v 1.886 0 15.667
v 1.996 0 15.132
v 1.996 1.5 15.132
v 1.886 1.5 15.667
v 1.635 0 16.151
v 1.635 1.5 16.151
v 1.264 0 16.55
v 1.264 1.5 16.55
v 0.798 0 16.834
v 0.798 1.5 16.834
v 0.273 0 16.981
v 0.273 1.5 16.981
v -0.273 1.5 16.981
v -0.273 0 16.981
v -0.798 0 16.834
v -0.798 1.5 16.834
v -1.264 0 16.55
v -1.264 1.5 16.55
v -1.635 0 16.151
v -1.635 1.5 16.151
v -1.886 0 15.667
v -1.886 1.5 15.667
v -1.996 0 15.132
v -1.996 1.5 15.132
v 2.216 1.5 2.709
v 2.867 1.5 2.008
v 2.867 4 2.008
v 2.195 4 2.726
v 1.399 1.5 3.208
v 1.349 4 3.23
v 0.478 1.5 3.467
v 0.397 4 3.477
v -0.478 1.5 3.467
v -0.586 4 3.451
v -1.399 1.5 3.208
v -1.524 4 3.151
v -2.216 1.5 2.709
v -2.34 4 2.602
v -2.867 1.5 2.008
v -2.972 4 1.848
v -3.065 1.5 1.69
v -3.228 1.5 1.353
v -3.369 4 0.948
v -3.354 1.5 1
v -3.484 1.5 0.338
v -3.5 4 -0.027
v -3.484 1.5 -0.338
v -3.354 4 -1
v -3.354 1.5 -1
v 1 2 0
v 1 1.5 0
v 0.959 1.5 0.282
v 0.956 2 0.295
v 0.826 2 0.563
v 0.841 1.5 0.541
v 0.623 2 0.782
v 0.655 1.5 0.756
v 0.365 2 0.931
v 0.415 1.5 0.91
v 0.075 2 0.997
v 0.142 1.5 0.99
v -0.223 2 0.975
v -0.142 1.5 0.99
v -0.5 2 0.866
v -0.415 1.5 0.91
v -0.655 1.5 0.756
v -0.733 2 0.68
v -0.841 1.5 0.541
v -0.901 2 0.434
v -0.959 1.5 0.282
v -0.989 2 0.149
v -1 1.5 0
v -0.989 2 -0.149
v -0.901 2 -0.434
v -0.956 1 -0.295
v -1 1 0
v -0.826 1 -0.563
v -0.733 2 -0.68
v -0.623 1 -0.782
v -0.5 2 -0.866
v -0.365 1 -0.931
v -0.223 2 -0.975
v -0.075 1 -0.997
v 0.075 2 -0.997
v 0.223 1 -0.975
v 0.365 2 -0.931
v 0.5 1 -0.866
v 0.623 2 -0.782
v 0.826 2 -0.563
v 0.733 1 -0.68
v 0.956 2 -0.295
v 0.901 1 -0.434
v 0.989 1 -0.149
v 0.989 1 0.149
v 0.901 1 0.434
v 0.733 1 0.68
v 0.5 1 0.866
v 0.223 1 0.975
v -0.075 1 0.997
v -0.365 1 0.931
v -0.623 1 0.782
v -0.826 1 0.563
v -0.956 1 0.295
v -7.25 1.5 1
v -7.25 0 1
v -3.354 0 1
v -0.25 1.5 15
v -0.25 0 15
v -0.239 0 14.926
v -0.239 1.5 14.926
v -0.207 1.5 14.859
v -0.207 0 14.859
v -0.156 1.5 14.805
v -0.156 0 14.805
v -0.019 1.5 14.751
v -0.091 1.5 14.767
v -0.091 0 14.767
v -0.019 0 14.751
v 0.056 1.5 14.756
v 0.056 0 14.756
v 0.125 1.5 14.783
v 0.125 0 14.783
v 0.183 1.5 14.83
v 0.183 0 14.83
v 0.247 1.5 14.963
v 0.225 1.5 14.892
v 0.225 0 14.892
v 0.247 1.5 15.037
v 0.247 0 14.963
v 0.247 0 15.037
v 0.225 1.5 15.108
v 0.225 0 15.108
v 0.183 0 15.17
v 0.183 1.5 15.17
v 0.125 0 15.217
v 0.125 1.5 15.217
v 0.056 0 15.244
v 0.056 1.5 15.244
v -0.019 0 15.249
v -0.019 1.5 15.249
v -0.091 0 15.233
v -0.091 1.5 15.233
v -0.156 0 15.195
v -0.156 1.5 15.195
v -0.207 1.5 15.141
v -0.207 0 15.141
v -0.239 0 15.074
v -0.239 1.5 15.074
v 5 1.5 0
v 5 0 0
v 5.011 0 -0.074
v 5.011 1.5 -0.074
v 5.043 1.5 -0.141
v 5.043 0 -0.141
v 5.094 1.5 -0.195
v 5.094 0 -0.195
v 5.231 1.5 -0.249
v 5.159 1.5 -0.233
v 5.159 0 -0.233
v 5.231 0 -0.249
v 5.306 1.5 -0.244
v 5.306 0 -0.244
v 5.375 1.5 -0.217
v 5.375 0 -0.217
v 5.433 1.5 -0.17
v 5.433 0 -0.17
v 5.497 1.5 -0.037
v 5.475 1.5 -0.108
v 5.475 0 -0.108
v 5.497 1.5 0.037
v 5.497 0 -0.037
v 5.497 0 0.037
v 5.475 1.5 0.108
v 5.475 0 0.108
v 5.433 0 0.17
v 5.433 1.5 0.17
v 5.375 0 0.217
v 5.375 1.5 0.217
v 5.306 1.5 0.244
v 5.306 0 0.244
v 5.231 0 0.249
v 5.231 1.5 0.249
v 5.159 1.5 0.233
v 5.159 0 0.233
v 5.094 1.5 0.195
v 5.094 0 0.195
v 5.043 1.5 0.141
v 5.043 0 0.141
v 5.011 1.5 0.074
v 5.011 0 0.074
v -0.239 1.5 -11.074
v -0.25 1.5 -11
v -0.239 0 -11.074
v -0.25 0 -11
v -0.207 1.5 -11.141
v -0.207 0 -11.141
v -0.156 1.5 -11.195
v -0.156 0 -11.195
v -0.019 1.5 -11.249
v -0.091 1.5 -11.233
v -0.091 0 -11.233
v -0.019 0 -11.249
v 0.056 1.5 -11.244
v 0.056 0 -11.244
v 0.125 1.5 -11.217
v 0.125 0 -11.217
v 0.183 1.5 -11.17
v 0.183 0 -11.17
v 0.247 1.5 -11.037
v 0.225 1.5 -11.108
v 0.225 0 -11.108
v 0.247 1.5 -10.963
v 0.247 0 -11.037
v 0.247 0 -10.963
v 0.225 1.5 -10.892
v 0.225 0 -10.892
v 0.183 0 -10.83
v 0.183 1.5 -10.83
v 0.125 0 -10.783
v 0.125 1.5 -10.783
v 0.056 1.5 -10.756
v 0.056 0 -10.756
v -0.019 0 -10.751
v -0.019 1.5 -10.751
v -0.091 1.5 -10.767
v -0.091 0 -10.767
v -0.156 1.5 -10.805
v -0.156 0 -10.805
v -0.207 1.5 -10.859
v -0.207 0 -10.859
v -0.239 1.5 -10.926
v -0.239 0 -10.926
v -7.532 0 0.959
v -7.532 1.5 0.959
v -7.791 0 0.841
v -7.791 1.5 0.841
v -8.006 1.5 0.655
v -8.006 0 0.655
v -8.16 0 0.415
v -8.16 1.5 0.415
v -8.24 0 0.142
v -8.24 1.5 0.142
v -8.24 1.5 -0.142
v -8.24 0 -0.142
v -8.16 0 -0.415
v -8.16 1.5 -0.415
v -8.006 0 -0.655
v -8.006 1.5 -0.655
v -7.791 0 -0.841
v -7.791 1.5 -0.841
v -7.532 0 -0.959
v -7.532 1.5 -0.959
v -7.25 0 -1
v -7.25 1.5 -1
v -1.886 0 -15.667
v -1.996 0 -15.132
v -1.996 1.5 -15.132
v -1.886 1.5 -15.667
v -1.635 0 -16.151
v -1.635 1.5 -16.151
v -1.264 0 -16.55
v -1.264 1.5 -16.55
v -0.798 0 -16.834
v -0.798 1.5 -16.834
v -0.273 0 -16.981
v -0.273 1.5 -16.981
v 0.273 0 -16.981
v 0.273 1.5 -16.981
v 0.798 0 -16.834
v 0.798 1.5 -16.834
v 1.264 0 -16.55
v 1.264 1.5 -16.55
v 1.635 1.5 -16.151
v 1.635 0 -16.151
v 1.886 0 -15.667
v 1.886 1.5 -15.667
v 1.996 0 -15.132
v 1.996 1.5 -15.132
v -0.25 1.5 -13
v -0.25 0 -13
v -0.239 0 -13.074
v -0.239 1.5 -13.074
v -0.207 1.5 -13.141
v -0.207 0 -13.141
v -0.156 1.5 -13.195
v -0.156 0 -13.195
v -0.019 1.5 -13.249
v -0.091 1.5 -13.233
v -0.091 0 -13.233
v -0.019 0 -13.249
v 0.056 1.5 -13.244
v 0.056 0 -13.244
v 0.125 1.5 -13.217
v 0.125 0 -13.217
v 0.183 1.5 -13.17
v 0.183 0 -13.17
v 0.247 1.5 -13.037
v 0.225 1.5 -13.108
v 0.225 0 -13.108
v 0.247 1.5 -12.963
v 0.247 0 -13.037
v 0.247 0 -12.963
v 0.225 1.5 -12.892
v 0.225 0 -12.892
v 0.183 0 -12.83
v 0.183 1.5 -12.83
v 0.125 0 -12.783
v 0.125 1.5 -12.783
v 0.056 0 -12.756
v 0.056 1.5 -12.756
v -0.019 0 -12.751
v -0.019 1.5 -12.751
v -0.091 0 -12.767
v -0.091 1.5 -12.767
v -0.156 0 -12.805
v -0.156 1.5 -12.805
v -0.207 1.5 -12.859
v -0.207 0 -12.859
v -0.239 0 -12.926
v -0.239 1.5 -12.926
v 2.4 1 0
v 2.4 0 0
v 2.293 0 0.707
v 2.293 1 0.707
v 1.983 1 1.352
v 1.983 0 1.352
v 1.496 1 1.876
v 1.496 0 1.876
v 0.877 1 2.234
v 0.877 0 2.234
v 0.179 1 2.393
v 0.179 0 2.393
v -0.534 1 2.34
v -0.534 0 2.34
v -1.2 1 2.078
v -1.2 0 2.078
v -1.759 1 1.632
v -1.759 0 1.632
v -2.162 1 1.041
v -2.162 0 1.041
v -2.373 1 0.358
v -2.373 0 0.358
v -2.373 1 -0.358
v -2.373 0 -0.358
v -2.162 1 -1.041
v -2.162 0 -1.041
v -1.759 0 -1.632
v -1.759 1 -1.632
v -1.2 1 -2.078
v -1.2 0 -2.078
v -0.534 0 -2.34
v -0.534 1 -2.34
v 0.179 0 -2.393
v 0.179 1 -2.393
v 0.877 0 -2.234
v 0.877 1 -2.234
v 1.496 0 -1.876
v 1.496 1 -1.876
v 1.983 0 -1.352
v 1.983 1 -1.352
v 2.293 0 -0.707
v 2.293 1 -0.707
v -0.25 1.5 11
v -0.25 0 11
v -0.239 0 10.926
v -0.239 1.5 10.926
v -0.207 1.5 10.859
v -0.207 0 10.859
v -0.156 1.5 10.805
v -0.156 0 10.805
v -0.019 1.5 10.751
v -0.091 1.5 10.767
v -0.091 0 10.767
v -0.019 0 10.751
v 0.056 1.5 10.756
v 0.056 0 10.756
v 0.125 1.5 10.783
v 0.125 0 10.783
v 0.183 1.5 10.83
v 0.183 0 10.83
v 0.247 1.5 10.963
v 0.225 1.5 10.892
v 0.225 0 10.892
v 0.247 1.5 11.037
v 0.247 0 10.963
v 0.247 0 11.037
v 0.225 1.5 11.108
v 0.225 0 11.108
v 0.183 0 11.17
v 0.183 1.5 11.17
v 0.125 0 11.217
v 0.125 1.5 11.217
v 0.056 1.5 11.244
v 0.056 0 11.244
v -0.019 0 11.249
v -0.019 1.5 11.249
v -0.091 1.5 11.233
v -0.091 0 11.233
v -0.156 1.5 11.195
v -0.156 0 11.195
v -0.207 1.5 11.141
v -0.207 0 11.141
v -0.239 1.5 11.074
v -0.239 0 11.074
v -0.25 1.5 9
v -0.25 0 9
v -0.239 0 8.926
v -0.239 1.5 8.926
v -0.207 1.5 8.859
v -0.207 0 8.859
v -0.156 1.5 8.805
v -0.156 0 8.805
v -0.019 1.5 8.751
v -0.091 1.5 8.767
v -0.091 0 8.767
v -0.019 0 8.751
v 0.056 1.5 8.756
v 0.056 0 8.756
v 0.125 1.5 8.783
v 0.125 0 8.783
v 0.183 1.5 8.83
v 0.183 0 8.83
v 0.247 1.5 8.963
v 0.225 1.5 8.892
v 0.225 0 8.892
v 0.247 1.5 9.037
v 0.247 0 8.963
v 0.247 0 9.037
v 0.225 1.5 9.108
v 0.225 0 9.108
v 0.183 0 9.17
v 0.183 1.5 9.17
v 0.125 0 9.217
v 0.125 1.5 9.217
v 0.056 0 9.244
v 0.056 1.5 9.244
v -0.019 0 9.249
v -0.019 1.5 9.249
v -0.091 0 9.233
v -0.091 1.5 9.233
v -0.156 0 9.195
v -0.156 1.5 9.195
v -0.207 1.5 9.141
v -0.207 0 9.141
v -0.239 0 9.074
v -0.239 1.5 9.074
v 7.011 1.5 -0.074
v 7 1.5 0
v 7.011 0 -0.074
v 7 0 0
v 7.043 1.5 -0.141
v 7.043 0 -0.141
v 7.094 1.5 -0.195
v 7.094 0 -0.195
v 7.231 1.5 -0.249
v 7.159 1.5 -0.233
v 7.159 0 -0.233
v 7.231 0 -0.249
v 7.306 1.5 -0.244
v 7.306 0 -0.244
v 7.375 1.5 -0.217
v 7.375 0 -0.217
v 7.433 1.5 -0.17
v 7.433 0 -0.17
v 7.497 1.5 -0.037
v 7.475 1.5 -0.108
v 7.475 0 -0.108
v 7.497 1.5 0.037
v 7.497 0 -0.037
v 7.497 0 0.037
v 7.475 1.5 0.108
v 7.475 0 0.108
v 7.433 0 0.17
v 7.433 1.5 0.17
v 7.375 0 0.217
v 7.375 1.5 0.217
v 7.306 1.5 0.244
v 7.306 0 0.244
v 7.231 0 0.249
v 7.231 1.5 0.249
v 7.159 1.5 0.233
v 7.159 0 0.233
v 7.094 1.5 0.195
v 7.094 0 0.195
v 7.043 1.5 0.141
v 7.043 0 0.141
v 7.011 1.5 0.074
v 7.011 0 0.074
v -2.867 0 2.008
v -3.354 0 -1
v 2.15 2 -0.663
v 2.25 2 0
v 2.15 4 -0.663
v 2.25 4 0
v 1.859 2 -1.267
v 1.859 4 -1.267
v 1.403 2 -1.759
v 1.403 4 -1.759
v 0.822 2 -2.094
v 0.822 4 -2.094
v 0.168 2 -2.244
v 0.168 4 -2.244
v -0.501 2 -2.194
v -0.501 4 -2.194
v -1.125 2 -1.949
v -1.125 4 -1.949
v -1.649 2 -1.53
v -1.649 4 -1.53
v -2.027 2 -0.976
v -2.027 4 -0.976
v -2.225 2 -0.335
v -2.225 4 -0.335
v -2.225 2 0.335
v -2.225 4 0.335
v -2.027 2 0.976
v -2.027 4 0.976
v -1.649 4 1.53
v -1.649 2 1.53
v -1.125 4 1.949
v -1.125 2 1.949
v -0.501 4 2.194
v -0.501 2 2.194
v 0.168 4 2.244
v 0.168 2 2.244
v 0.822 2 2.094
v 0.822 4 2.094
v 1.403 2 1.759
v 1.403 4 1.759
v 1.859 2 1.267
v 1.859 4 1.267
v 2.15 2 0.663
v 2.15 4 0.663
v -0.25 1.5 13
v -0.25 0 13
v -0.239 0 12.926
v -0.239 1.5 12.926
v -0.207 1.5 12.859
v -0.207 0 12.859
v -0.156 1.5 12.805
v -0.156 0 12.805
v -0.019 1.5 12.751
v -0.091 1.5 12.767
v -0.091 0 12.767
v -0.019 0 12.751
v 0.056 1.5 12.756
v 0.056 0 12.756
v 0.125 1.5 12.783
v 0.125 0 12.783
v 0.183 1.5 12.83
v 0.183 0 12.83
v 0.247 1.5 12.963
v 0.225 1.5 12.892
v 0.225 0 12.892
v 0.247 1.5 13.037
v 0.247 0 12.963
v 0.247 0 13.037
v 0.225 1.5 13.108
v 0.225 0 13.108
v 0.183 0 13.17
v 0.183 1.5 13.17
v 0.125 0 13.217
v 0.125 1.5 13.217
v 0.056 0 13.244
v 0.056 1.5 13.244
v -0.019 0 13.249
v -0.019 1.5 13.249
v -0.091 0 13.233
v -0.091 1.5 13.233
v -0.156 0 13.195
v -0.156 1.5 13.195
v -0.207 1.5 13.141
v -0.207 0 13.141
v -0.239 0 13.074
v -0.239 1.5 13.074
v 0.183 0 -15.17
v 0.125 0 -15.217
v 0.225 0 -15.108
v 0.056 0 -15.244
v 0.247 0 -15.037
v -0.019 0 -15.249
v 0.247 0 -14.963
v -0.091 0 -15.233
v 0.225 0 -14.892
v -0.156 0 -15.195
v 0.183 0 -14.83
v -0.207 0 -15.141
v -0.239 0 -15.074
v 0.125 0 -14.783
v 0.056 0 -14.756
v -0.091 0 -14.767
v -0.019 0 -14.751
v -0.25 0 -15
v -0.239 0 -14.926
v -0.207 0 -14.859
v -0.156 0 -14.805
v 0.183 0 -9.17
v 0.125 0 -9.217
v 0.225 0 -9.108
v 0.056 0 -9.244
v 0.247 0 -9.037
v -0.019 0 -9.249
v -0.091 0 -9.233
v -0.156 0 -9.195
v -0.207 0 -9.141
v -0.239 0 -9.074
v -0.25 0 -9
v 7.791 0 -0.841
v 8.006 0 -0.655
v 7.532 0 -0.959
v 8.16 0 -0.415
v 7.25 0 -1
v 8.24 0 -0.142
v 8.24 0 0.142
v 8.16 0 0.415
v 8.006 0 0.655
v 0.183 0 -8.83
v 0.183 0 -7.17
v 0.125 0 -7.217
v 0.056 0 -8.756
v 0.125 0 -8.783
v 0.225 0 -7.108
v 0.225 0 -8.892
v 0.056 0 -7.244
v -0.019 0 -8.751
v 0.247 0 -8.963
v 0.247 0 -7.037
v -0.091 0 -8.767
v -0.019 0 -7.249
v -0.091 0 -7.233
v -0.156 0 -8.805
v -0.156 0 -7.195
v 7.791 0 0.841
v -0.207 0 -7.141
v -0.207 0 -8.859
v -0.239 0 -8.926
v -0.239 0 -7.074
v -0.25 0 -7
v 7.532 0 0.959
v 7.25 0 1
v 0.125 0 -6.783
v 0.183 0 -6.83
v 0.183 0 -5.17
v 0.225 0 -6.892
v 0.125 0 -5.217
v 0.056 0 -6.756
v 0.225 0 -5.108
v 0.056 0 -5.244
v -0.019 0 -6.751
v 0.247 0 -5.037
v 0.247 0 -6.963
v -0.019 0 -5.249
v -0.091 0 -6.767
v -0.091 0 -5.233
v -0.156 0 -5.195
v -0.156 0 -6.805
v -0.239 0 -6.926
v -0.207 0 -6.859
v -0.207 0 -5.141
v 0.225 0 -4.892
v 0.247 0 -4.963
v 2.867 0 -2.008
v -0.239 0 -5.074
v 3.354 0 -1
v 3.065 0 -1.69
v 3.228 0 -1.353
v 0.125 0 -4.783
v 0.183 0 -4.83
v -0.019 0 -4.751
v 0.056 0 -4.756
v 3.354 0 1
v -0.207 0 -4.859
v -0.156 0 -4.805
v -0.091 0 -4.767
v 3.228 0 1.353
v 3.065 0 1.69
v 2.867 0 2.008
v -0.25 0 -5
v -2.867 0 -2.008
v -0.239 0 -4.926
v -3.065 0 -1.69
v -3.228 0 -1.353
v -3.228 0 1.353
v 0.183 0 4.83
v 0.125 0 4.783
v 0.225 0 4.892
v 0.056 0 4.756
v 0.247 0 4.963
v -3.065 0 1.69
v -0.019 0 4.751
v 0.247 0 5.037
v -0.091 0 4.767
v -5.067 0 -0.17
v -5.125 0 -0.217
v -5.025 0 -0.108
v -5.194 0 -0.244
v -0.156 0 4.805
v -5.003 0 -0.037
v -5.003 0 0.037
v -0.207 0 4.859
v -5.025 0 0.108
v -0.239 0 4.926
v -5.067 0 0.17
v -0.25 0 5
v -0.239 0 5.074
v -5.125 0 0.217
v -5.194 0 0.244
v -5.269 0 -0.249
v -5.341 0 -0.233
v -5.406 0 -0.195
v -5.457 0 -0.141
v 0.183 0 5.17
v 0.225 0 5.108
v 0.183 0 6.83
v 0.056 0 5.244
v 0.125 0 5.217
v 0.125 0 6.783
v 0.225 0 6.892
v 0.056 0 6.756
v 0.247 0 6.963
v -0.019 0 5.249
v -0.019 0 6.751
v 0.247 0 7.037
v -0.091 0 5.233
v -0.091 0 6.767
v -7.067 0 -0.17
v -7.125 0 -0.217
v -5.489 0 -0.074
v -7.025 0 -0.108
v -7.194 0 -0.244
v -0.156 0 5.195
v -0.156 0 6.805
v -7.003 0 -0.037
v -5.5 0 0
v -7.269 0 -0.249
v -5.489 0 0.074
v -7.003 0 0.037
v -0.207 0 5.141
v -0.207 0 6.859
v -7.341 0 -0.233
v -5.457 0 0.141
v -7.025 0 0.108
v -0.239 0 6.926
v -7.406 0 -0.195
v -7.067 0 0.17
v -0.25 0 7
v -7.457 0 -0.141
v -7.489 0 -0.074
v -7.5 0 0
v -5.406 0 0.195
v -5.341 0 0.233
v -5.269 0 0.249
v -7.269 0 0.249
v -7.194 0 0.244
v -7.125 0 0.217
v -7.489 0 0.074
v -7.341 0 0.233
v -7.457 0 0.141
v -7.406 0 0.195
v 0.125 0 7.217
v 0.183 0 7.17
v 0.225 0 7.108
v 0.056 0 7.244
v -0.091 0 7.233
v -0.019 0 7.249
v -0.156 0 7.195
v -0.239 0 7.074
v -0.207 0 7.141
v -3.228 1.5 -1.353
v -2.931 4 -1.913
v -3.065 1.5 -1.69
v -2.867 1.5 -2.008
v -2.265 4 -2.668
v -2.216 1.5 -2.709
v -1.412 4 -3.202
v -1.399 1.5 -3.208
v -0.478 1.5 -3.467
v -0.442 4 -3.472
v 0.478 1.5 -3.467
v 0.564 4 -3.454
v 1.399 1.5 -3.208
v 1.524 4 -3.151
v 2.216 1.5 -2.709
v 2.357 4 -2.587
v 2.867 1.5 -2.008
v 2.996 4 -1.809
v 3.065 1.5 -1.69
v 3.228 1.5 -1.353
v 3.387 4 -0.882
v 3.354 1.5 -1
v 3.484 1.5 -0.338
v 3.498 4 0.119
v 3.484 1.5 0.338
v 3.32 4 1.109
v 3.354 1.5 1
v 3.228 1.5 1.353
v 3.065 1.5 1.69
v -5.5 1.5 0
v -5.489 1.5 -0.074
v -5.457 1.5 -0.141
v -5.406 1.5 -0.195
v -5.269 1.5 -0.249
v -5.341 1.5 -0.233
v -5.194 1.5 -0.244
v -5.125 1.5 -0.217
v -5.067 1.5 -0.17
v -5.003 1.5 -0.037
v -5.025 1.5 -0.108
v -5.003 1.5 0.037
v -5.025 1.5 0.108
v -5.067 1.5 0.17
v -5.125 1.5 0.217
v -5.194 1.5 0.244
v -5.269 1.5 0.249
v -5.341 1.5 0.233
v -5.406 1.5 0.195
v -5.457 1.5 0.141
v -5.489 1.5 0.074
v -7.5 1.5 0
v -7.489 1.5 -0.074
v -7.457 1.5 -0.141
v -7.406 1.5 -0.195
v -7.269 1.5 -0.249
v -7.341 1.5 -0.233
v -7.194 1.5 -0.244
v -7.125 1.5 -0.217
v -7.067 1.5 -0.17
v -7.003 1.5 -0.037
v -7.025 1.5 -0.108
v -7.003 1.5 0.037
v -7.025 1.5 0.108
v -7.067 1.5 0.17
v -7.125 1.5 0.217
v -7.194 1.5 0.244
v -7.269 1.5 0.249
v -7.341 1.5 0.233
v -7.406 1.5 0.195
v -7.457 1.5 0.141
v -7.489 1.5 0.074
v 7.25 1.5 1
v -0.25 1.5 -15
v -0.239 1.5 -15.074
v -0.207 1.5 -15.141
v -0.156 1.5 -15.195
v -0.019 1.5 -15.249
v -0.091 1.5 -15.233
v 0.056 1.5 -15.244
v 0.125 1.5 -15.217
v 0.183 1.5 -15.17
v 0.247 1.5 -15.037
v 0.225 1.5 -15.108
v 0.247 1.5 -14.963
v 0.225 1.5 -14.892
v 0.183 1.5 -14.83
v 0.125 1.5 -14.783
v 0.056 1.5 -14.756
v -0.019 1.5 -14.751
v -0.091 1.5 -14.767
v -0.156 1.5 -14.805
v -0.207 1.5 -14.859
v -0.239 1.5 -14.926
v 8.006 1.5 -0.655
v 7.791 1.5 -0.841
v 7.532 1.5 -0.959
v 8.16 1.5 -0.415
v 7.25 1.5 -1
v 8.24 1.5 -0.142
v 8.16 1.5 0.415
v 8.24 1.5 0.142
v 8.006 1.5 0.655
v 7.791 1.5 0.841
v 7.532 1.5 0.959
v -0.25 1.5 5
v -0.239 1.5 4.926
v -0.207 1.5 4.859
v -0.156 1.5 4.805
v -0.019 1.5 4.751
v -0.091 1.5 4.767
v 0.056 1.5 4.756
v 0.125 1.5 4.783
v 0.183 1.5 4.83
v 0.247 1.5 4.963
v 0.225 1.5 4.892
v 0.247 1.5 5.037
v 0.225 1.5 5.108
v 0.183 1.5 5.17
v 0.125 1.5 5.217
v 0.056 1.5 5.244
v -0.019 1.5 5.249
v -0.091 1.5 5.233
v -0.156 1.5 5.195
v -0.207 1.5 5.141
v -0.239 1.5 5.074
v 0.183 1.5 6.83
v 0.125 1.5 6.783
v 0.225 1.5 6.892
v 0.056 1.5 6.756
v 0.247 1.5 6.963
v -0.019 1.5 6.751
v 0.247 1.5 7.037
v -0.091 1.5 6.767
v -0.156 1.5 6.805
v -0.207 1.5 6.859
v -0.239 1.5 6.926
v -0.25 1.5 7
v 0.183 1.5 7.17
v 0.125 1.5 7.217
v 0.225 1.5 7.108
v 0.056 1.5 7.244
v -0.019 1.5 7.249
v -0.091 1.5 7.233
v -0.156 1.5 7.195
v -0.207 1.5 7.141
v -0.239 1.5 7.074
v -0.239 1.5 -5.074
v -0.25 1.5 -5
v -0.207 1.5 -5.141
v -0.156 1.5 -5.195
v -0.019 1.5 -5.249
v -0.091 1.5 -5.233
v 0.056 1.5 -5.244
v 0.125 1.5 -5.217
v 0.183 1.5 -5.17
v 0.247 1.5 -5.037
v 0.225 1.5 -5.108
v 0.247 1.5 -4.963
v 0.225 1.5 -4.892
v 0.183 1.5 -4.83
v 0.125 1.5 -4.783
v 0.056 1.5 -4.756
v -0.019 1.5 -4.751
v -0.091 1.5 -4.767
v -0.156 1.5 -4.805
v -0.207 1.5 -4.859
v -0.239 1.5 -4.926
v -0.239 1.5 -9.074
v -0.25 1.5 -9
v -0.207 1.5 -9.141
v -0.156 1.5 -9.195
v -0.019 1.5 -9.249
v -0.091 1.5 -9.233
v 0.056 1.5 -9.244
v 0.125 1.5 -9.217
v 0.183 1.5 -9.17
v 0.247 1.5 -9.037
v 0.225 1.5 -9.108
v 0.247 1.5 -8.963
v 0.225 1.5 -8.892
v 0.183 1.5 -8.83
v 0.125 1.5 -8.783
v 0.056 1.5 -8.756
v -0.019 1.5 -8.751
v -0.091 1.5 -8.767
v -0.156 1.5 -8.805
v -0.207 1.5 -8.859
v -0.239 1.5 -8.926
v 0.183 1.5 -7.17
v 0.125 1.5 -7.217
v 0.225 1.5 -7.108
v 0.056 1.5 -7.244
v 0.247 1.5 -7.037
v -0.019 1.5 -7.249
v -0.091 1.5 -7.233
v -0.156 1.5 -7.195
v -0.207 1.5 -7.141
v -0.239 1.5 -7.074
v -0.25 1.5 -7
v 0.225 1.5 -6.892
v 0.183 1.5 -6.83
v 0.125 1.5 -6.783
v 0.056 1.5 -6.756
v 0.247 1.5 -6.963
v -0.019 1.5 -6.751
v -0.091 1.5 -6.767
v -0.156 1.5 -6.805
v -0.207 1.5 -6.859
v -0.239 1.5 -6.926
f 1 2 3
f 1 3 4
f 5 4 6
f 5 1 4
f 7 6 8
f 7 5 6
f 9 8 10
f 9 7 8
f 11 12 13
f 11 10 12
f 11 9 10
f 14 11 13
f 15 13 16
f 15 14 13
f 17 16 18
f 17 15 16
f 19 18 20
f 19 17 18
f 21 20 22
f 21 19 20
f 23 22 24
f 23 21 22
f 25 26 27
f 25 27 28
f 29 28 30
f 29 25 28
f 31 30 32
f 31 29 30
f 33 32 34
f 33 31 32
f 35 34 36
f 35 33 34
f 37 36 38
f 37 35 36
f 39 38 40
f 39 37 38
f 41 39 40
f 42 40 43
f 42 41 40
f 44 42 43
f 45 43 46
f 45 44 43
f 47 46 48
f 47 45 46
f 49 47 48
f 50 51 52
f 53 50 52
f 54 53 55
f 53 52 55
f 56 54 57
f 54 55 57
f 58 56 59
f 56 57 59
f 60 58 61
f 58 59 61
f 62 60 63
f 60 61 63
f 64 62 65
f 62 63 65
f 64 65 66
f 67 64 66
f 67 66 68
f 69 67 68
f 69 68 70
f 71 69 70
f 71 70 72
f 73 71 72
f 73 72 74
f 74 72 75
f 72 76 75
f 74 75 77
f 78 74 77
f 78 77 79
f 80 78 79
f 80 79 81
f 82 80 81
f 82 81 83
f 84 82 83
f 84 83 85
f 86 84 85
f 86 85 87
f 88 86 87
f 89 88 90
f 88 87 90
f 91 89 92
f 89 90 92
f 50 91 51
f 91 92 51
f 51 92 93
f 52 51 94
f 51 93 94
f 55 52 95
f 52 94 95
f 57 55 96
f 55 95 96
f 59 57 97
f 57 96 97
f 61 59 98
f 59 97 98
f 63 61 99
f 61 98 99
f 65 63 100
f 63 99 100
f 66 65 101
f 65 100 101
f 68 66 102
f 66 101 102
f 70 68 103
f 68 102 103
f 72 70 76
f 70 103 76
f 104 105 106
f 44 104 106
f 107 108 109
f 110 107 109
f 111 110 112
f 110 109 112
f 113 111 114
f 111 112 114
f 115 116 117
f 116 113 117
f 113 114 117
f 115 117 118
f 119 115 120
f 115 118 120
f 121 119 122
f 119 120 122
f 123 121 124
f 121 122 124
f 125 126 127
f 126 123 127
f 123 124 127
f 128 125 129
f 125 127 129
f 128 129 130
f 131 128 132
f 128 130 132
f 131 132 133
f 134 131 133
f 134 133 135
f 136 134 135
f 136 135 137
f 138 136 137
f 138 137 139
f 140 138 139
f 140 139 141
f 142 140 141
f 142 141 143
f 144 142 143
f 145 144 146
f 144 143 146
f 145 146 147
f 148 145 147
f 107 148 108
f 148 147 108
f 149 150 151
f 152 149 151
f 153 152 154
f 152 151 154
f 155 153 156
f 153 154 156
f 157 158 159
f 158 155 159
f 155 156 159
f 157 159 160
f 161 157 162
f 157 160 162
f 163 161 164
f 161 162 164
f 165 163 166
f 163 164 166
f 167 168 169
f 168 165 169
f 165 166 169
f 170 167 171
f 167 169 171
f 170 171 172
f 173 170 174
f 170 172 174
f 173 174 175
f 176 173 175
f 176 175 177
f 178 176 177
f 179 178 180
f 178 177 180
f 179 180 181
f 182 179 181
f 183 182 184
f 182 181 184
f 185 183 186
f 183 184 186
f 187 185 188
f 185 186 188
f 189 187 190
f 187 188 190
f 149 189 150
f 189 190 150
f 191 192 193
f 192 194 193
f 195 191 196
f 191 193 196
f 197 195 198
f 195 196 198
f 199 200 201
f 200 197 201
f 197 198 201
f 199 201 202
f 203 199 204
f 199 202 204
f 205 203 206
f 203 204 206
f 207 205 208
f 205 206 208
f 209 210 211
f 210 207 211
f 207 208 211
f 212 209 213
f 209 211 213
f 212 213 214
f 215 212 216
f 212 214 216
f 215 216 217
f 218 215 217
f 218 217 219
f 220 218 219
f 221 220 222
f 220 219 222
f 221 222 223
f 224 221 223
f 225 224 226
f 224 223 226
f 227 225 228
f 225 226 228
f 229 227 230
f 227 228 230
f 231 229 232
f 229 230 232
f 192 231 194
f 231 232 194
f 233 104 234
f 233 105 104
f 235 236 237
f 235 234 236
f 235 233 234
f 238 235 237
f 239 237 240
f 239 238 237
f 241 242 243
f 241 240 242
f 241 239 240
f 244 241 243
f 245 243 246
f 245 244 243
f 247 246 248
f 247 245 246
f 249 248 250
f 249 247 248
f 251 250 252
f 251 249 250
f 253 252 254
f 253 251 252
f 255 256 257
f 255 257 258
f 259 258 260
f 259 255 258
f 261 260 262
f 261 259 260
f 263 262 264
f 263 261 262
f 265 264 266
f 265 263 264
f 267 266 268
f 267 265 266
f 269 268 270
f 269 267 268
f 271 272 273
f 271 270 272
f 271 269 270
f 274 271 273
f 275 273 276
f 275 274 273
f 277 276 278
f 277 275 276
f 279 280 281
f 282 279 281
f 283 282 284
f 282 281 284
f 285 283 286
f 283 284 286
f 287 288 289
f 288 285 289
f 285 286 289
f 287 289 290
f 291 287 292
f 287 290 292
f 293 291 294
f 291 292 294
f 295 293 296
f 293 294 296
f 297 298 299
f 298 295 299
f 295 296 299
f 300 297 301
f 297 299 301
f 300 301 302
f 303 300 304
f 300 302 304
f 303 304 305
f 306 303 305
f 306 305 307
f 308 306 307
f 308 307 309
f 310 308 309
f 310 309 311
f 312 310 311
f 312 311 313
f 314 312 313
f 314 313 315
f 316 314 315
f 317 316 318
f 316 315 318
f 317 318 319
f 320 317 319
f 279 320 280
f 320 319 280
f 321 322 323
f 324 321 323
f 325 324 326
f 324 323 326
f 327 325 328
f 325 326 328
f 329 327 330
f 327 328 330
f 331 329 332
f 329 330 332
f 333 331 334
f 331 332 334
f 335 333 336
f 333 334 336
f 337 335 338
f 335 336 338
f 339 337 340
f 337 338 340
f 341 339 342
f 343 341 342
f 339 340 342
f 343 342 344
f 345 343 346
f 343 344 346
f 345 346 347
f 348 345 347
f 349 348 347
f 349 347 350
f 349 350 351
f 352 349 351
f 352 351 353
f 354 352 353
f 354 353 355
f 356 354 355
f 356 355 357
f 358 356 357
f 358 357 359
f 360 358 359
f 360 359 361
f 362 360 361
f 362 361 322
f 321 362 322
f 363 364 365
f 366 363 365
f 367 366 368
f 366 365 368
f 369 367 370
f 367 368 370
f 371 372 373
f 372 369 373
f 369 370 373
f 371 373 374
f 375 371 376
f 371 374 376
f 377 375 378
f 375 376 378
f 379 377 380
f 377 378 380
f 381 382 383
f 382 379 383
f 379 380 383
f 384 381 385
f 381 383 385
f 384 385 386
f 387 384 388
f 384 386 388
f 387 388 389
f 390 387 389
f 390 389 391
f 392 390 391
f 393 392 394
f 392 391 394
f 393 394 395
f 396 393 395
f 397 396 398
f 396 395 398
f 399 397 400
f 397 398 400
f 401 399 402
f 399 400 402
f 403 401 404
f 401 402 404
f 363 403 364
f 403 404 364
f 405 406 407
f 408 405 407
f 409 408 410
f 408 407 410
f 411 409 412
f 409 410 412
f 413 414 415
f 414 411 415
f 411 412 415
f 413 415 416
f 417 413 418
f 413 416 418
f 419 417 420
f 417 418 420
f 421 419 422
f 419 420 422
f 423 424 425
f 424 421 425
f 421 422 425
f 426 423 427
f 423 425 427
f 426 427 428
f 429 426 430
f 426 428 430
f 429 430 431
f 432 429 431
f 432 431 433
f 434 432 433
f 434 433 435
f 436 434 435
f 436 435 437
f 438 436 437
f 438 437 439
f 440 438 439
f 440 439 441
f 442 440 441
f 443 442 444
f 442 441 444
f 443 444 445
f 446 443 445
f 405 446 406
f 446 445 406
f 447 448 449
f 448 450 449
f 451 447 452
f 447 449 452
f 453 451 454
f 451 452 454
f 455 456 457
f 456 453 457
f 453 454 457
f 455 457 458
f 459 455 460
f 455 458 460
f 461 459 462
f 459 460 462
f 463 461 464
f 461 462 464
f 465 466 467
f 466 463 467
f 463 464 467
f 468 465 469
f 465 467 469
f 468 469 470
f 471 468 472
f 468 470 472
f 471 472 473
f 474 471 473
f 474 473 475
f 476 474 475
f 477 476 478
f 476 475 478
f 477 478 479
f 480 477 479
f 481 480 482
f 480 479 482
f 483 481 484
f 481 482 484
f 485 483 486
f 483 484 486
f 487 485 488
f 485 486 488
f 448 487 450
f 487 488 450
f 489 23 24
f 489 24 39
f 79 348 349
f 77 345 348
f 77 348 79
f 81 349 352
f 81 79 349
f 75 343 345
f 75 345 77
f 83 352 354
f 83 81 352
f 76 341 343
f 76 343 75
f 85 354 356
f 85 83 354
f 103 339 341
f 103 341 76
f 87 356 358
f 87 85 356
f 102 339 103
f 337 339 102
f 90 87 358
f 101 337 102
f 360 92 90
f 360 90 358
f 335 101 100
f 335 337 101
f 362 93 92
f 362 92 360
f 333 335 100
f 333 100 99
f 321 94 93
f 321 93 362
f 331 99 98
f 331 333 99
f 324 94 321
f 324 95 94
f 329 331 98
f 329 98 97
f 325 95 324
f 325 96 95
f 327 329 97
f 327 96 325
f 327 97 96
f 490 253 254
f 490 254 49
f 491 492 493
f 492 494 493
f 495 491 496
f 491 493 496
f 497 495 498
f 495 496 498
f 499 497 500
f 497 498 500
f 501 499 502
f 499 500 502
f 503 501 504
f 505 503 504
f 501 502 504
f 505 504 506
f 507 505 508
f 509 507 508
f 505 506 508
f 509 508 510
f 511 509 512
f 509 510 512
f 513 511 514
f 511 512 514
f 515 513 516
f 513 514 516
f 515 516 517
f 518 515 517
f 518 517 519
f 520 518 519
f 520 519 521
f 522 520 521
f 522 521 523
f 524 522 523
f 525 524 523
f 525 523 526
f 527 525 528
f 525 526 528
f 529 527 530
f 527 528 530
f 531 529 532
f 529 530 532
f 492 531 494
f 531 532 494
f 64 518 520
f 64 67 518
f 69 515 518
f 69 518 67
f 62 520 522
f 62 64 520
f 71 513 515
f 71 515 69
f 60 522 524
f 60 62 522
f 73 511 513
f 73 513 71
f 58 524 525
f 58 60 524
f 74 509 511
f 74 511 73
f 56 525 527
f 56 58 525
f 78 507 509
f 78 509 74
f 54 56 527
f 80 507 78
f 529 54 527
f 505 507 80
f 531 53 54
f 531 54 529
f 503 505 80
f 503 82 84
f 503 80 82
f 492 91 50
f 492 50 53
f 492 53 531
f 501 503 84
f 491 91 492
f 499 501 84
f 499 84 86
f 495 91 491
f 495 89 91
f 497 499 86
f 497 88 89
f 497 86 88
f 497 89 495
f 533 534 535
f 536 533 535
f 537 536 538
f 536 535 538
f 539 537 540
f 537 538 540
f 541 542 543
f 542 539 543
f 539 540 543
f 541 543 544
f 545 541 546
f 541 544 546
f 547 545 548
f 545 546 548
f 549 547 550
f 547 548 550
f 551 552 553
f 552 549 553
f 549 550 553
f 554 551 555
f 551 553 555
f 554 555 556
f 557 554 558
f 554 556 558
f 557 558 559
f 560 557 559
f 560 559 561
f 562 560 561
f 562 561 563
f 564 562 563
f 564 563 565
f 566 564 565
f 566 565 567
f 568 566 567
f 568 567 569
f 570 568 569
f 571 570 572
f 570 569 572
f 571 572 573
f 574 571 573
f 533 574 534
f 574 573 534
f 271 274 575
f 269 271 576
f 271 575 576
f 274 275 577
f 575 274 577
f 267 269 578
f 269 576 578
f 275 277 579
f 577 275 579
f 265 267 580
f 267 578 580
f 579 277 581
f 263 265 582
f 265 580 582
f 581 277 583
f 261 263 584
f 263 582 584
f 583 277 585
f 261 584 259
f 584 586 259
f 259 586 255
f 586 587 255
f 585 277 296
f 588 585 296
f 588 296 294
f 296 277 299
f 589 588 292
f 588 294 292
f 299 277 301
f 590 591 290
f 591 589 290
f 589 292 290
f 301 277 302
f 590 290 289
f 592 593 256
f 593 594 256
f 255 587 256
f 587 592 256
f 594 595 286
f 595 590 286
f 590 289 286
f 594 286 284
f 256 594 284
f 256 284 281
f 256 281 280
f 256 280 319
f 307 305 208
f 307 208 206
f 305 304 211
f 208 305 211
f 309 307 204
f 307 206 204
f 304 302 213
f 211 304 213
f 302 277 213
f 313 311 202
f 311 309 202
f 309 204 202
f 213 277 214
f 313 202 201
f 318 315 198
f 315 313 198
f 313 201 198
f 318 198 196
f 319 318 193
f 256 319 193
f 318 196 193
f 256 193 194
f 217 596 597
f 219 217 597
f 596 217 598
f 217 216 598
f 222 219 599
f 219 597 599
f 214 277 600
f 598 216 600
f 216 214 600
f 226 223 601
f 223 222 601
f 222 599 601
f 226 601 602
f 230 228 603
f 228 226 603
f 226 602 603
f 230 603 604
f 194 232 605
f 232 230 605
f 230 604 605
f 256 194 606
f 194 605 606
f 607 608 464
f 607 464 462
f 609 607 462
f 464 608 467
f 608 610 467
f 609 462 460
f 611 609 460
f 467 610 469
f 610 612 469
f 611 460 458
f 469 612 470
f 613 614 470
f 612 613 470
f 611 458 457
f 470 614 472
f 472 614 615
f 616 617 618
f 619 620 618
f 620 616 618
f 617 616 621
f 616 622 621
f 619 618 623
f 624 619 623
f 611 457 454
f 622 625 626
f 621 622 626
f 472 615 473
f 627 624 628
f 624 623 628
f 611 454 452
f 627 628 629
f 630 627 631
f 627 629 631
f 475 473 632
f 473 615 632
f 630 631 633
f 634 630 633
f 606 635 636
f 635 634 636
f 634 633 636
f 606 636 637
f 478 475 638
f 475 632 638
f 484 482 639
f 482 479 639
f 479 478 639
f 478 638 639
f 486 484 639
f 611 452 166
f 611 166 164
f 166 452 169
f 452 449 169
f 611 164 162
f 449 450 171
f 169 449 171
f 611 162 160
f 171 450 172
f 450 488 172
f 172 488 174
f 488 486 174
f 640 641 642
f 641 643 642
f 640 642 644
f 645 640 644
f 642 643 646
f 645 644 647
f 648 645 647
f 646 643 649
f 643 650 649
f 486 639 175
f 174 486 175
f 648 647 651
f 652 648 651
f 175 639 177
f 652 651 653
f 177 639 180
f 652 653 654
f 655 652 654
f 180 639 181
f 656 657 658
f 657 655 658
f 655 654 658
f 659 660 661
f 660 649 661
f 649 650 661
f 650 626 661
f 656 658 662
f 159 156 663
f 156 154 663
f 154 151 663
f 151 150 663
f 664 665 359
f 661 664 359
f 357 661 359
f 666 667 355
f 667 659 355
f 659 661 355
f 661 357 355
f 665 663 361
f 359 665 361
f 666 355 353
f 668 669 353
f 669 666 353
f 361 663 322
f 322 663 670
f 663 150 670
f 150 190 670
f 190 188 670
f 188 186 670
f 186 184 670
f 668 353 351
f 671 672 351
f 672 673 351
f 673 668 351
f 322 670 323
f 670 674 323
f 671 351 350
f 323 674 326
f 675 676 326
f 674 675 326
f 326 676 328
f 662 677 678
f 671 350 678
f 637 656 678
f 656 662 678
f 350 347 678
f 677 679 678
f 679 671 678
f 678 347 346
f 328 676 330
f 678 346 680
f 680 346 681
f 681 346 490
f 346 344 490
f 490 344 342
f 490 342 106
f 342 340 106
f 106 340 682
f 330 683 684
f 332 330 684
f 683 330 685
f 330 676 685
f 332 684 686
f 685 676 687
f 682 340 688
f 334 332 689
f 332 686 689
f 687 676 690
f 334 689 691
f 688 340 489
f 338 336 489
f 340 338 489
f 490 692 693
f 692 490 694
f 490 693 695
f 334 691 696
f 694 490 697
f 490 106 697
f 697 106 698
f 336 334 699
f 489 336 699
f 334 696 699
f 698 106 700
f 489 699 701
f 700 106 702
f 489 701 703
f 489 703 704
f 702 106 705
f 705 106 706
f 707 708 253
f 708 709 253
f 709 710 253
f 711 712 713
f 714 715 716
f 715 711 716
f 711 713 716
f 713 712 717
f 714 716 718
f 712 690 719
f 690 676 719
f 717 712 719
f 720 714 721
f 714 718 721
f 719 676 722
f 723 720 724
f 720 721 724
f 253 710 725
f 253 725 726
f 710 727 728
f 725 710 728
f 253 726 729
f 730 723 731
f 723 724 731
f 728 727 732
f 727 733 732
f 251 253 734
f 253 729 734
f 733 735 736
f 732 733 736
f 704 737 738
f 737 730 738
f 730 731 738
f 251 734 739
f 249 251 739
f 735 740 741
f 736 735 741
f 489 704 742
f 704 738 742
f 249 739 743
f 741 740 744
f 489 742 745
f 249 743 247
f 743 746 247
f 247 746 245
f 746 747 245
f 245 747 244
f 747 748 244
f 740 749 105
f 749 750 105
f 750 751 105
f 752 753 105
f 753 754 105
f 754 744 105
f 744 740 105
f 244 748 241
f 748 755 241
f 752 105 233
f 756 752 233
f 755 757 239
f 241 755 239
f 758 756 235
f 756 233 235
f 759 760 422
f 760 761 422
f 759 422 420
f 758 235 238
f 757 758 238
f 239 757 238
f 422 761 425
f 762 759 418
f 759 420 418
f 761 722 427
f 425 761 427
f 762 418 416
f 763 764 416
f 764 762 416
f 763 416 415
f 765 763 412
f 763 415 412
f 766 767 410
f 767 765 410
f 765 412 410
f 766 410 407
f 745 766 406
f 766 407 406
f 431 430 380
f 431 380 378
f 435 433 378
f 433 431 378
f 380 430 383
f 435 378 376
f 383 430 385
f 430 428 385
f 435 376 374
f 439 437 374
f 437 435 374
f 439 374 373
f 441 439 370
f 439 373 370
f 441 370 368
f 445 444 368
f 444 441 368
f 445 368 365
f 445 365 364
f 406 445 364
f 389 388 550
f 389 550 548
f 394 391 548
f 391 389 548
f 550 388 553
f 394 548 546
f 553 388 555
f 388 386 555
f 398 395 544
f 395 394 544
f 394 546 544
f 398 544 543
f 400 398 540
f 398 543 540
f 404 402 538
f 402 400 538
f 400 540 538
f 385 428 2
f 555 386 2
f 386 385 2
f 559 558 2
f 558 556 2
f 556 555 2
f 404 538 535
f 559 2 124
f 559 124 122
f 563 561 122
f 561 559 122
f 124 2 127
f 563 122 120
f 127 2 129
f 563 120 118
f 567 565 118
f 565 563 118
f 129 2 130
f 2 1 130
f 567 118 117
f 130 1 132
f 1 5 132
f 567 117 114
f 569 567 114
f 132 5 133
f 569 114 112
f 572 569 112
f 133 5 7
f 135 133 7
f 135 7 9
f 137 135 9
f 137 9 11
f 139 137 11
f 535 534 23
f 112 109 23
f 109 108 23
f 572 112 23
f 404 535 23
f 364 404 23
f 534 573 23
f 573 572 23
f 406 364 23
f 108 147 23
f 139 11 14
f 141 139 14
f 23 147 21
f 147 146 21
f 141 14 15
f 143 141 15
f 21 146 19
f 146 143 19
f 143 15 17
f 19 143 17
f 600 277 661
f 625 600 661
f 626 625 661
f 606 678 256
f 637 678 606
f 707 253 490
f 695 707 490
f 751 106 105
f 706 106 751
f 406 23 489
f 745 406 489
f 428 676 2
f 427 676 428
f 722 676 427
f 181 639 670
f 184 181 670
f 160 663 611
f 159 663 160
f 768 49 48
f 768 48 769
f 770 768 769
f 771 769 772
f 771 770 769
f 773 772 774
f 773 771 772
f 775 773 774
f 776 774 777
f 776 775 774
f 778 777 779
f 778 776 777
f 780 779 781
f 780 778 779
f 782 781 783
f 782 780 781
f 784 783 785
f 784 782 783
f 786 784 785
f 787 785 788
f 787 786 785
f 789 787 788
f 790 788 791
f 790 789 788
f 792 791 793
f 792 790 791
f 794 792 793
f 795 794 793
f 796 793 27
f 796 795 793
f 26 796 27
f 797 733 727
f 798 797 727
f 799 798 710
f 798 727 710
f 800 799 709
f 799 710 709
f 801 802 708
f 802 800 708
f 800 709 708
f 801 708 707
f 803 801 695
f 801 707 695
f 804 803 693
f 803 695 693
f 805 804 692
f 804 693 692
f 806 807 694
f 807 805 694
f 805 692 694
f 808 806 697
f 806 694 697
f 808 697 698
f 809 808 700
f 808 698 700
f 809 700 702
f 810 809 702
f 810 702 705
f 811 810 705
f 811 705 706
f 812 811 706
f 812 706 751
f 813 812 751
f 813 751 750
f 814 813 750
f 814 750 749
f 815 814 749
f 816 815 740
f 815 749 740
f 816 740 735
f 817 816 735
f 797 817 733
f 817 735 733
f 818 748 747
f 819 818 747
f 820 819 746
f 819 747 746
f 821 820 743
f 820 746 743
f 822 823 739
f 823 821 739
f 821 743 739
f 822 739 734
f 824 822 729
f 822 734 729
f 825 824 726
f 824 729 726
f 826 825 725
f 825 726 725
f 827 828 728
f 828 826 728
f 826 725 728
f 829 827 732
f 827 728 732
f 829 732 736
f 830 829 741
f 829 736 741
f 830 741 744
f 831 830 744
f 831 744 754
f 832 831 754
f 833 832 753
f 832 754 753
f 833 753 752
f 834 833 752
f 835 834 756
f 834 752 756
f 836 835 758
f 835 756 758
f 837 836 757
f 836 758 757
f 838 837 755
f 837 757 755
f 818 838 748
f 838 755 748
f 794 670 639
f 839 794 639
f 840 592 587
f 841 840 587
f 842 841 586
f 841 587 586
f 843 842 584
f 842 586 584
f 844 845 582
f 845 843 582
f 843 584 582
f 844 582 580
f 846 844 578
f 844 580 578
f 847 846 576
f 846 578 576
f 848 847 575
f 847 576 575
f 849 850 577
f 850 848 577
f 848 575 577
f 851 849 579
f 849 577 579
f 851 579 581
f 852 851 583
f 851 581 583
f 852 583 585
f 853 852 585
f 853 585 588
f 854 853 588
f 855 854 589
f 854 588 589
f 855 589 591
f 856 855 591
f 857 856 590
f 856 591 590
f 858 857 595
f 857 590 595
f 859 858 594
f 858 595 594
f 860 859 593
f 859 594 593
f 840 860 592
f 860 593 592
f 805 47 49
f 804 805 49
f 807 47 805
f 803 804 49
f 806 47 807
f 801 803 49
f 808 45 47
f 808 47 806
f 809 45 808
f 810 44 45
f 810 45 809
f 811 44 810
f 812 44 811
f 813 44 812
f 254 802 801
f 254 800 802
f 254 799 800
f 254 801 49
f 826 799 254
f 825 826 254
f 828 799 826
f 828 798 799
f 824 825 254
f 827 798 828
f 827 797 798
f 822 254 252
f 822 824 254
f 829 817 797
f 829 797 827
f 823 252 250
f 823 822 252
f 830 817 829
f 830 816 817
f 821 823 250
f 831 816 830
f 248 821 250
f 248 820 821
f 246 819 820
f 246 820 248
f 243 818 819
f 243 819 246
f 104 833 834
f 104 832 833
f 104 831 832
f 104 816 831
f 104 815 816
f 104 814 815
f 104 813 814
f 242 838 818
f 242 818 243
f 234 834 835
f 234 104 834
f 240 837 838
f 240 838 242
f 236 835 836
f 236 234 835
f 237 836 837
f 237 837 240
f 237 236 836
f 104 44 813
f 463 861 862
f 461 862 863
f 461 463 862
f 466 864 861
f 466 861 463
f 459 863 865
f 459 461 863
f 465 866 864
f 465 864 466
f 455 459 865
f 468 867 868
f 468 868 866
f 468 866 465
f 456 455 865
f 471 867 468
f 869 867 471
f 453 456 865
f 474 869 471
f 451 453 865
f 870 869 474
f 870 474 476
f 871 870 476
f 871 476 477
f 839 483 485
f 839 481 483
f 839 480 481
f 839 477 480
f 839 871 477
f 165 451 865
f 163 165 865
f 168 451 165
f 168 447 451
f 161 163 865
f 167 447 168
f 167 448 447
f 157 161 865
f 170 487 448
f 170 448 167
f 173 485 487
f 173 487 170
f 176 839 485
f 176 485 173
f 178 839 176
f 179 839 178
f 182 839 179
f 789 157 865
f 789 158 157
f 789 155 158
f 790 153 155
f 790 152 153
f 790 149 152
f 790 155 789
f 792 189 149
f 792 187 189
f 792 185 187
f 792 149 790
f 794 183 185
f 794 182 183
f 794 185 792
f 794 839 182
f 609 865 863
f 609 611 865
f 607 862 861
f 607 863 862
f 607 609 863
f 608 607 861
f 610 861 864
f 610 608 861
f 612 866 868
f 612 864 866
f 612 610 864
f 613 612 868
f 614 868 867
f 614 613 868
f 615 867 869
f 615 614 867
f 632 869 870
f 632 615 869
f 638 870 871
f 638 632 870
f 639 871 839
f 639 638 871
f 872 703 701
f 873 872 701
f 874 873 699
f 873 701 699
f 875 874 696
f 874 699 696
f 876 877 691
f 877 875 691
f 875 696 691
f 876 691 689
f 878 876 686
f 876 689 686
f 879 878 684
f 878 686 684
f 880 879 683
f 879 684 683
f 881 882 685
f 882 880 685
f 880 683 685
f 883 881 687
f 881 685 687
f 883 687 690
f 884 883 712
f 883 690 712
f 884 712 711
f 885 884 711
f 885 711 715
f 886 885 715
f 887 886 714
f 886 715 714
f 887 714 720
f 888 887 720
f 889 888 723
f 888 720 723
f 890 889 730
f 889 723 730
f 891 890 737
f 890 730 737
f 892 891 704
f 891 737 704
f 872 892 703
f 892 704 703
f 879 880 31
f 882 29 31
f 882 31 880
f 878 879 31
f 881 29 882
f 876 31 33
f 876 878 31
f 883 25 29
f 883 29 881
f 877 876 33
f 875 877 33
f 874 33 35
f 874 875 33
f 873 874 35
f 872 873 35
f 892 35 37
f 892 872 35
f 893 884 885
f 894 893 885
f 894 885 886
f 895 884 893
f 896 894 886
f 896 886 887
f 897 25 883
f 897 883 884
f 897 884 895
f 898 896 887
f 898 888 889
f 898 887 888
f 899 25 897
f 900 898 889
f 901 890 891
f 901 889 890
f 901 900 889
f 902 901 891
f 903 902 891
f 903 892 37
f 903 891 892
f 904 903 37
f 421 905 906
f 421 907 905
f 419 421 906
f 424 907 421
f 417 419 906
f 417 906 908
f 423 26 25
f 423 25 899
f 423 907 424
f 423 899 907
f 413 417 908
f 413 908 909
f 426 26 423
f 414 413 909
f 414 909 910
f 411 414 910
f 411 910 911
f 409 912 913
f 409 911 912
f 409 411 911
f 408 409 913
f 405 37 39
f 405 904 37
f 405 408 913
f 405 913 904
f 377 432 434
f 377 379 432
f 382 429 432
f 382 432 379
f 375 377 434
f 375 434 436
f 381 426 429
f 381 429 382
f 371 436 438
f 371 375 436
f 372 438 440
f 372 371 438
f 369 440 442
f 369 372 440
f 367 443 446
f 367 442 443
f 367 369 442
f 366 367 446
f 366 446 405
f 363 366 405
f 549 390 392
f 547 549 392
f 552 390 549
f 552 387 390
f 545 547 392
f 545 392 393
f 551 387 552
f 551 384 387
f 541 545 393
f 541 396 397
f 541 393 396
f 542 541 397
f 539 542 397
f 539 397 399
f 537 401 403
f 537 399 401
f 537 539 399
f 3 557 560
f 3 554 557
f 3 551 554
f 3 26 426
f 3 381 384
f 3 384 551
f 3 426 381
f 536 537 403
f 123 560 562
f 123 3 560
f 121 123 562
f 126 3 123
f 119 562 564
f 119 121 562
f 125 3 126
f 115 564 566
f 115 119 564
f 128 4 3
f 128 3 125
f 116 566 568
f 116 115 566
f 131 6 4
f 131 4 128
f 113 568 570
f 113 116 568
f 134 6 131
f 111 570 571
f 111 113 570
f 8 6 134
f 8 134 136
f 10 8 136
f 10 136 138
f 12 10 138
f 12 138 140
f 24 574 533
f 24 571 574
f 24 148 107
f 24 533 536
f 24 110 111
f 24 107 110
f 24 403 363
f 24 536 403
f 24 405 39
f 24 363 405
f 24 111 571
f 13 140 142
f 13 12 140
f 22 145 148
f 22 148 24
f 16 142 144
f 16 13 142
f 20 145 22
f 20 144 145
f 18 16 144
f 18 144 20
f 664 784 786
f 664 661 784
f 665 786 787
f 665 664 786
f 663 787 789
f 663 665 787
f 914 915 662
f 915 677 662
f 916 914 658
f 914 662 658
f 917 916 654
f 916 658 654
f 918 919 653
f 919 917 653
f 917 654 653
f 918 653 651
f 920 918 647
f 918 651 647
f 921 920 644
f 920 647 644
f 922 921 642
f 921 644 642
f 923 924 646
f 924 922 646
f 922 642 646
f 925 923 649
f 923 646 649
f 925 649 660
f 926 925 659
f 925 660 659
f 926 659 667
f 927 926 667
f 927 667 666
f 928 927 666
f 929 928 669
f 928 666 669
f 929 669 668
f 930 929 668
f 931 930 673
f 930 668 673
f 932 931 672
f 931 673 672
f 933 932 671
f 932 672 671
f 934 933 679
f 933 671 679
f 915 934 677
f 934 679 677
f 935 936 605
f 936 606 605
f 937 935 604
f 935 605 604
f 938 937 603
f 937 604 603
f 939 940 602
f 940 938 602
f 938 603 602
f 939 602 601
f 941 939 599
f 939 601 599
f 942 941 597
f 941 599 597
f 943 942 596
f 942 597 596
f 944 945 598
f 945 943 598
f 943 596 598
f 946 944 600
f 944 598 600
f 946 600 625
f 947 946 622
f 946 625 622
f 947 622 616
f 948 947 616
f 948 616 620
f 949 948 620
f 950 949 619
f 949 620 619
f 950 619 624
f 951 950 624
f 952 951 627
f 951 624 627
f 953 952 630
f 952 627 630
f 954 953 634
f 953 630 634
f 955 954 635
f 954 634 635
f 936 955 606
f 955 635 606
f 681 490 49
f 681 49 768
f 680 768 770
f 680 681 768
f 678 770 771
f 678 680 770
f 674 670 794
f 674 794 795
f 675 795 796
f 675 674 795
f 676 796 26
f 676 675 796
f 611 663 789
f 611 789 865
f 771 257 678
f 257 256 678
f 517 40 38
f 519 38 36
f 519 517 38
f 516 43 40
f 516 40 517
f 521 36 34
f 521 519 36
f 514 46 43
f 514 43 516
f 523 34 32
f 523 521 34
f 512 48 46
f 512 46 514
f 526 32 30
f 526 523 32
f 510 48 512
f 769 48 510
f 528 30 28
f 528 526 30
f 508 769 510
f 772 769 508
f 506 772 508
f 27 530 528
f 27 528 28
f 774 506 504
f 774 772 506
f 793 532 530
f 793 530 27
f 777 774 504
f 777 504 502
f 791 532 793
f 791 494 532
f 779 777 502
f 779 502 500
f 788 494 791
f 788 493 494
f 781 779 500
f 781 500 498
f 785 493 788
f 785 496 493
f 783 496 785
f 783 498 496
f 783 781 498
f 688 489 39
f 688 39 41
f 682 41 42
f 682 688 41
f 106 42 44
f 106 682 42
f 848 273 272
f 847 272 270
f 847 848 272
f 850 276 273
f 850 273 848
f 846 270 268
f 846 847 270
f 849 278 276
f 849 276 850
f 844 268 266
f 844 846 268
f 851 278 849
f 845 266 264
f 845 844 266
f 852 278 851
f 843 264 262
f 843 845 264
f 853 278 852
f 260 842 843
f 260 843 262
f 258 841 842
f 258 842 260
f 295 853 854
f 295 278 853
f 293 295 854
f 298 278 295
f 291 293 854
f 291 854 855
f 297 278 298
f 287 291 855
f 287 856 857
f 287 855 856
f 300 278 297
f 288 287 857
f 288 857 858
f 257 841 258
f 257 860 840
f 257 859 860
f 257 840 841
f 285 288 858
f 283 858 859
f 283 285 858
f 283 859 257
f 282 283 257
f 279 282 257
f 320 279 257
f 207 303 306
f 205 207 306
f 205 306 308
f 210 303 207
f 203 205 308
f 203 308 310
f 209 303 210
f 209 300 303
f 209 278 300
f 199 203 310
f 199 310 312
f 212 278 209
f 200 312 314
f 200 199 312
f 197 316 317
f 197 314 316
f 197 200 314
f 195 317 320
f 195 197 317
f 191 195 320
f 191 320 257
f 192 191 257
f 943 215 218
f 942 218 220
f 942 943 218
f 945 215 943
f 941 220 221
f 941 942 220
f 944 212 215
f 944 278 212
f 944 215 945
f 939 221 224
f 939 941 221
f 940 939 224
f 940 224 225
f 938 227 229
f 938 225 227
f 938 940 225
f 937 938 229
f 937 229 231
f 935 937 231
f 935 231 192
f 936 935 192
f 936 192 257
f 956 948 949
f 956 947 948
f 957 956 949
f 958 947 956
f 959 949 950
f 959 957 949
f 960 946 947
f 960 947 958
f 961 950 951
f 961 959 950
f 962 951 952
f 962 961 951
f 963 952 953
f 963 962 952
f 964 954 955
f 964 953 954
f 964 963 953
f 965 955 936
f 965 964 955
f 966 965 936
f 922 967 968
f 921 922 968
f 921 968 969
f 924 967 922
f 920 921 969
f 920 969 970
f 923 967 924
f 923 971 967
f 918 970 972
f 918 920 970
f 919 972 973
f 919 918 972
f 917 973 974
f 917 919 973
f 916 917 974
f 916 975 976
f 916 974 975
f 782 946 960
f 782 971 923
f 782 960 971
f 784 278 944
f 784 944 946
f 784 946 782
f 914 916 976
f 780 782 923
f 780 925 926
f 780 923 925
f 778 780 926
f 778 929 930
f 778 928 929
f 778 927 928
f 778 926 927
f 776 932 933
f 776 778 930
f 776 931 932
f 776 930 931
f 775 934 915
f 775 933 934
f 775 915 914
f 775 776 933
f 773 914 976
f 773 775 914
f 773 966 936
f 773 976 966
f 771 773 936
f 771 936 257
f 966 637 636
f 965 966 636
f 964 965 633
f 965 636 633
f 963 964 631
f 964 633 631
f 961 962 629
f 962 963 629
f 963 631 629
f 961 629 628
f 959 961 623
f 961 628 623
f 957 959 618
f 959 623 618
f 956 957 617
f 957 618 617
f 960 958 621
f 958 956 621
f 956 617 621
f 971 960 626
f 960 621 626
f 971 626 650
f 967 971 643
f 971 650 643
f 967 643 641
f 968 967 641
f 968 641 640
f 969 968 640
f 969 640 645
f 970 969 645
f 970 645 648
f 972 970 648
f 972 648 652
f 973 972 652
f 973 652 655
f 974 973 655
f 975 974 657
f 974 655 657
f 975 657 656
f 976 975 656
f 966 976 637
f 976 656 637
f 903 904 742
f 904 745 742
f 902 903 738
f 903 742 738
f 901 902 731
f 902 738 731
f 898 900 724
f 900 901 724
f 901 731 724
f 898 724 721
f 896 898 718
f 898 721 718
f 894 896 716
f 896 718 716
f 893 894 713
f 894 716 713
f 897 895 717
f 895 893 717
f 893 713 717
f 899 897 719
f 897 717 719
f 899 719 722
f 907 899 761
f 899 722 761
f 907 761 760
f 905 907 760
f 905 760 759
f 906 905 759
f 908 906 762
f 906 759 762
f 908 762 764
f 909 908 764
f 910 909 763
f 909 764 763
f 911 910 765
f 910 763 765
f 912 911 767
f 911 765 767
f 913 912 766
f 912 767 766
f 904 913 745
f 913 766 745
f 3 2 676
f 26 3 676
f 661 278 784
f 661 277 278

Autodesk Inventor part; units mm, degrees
ref_plane "XZ Plane" through (0, 0, 0) normal (0, 1, 0) x (-1, 0, 0)
ref_plane "XY Plane" through (0, 0, 0) normal (0, 0, 1) x (1, 0, 0)
sketch "Эскиз1" plane through (0, 0, 0) normal (0, 1, 0) x (-1, 0, 0)
  circle A0 centre (0, 0) radius 1
  arc A1 (1.9956, 15.1325) -> (-1.9956, 15.1325) centre (0, 15) ccw
  line L0 (1.9956, 15.1325) -> (2.8667, 2.008)
  line L1 (-1.9956, 15.1325) -> (-2.8667, 2.008)
  circle A2 centre (0, 15) radius 0.25
  circle A3 centre (0, 13) radius 0.25
  circle A4 centre (0, 11) radius 0.25
  circle A5 centre (0, 9) radius 0.25
  circle A6 centre (0, 7) radius 0.25
  circle A7 centre (0, 5) radius 0.25
  line L2 (2.8667, 2.008) -> (3, 0) construction
  line L3 (-2.8667, 2.008) -> (-3, 0) construction
  line L4 (-13.6979, 0) -> (13.2438, 0) construction
  arc A8 (-1.9956, -15.1325) -> (1.9956, -15.1325) centre (0, -15) ccw
  line L5 (1.9956, -15.1325) -> (2.8667, -2.008)
  line L6 (-1.9956, -15.1325) -> (-2.8667, -2.008)
  circle A9 centre (0, -15) radius 0.25
  circle A10 centre (0, -13) radius 0.25
  circle A11 centre (0, -11) radius 0.25
  circle A12 centre (0, -9) radius 0.25
  circle A13 centre (0, -7) radius 0.25
  circle A14 centre (0, -5) radius 0.25
  line L7 (2.8667, -2.008) -> (3, 0) construction
  line L8 (-2.8667, -2.008) -> (-3, 0) construction
  arc A15 (7.25, -1) -> (7.25, 1) centre (7.25, 0) ccw
  arc A16 (-7.25, 1) -> (-7.25, -1) centre (-7.25, 0) ccw
  arc A17 (2.8667, -2.008) -> (3.3541, -1) centre (0, 0) ccw
  arc A18 (3.3541, 1) -> (2.8667, 2.008) centre (0, 0) ccw
  arc A19 (-2.8667, 2.008) -> (-3.3541, 1) centre (0, 0) ccw
  arc A20 (-3.3541, -1) -> (-2.8667, -2.008) centre (0, 0) ccw
  line L9 (7.25, 1) -> (3.3541, 1)
  line L10 (-3.3541, 1) -> (-7.25, 1)
  line L11 (7.25, -1) -> (3.3541, -1)
  line L12 (-3.3541, -1) -> (-7.25, -1)
  circle A21 centre (7.25, 0) radius 0.25
  circle A22 centre (-7.25, 0) radius 0.25
  circle A23 centre (-5.25, 0) radius 0.25
  circle A24 centre (5.25, 0) radius 0.25
  dimension "d1" = 2
  dimension "d2" = 3
  dimension "d3" = 3
  dimension "d4" = 15
  dimension "d5" = 2
  dimension "d6" = 0.5
  dimension "d7" = 0.5
  dimension "d8" = 0.5
  dimension "d9" = 0.5
  dimension "d10" = 0.5
  dimension "d11" = 0.5
  dimension "d13" = 2
  dimension "d14" = 2
  dimension "d15" = 2
  dimension "d16" = 2
  dimension "d17" = 2
  dimension "d32" = 2
  dimension "d33" = 2
  dimension "d34" = 14.5
  dimension "d35" = 7.25
  dimension "d36" = 0.5
  dimension "d37" = 0.5
  dimension "d38" = 0.5
  dimension "d39" = 0.5
  dimension "d40" = 2
  dimension "d41" = 2
extrude "Выдавливание1" add sketch "Эскиз1" along normal blind 1.5
sketch "Эскиз2" plane through (0, 1.5, 0) normal (0, 1, 0) x (1, 0, 0)
  arc A0 (2.8667, -2.008) -> (-3.3541, 1) centre (0, 0) ccw projected
  circle A1 centre (0, 0) radius 1 projected
  circle A2 centre (0, 0) radius 3.5
  point P0 (-2.8667, -2.008)
extrude "Выдавливание2" add sketch "Эскиз2" along normal blind 2.5
sketch "Эскиз3" plane through (0, 4, 0) normal (0, 1, 0) x (1, 0, 0)
  circle A0 centre (0, 0) radius 1 projected
  circle A1 centre (0, 0) radius 2.25
  dimension "d23" = 4.5
extrude "Выдавливание3" cut sketch "Эскиз3" against normal blind 2
sketch "Эскиз4" plane through (0, 0, 0) normal (0, -1, 0) x (1, 0, 0)
  circle A0 centre (0, 0) radius 2.4
  dimension "d29" = 4.8
extrude "Выдавливание4" cut sketch "Эскиз4" against normal blind 1
equation "\"d7\" = d6"
equation "\"d8\" = d6"
equation "\"d9\" = d6"
equation "\"d10\" = d6"
equation "\"d11\" = d6"
equation "\"d35\" = 0.5 * d34"
properties part number "Arm 3" material "Нейлон 6/6"
